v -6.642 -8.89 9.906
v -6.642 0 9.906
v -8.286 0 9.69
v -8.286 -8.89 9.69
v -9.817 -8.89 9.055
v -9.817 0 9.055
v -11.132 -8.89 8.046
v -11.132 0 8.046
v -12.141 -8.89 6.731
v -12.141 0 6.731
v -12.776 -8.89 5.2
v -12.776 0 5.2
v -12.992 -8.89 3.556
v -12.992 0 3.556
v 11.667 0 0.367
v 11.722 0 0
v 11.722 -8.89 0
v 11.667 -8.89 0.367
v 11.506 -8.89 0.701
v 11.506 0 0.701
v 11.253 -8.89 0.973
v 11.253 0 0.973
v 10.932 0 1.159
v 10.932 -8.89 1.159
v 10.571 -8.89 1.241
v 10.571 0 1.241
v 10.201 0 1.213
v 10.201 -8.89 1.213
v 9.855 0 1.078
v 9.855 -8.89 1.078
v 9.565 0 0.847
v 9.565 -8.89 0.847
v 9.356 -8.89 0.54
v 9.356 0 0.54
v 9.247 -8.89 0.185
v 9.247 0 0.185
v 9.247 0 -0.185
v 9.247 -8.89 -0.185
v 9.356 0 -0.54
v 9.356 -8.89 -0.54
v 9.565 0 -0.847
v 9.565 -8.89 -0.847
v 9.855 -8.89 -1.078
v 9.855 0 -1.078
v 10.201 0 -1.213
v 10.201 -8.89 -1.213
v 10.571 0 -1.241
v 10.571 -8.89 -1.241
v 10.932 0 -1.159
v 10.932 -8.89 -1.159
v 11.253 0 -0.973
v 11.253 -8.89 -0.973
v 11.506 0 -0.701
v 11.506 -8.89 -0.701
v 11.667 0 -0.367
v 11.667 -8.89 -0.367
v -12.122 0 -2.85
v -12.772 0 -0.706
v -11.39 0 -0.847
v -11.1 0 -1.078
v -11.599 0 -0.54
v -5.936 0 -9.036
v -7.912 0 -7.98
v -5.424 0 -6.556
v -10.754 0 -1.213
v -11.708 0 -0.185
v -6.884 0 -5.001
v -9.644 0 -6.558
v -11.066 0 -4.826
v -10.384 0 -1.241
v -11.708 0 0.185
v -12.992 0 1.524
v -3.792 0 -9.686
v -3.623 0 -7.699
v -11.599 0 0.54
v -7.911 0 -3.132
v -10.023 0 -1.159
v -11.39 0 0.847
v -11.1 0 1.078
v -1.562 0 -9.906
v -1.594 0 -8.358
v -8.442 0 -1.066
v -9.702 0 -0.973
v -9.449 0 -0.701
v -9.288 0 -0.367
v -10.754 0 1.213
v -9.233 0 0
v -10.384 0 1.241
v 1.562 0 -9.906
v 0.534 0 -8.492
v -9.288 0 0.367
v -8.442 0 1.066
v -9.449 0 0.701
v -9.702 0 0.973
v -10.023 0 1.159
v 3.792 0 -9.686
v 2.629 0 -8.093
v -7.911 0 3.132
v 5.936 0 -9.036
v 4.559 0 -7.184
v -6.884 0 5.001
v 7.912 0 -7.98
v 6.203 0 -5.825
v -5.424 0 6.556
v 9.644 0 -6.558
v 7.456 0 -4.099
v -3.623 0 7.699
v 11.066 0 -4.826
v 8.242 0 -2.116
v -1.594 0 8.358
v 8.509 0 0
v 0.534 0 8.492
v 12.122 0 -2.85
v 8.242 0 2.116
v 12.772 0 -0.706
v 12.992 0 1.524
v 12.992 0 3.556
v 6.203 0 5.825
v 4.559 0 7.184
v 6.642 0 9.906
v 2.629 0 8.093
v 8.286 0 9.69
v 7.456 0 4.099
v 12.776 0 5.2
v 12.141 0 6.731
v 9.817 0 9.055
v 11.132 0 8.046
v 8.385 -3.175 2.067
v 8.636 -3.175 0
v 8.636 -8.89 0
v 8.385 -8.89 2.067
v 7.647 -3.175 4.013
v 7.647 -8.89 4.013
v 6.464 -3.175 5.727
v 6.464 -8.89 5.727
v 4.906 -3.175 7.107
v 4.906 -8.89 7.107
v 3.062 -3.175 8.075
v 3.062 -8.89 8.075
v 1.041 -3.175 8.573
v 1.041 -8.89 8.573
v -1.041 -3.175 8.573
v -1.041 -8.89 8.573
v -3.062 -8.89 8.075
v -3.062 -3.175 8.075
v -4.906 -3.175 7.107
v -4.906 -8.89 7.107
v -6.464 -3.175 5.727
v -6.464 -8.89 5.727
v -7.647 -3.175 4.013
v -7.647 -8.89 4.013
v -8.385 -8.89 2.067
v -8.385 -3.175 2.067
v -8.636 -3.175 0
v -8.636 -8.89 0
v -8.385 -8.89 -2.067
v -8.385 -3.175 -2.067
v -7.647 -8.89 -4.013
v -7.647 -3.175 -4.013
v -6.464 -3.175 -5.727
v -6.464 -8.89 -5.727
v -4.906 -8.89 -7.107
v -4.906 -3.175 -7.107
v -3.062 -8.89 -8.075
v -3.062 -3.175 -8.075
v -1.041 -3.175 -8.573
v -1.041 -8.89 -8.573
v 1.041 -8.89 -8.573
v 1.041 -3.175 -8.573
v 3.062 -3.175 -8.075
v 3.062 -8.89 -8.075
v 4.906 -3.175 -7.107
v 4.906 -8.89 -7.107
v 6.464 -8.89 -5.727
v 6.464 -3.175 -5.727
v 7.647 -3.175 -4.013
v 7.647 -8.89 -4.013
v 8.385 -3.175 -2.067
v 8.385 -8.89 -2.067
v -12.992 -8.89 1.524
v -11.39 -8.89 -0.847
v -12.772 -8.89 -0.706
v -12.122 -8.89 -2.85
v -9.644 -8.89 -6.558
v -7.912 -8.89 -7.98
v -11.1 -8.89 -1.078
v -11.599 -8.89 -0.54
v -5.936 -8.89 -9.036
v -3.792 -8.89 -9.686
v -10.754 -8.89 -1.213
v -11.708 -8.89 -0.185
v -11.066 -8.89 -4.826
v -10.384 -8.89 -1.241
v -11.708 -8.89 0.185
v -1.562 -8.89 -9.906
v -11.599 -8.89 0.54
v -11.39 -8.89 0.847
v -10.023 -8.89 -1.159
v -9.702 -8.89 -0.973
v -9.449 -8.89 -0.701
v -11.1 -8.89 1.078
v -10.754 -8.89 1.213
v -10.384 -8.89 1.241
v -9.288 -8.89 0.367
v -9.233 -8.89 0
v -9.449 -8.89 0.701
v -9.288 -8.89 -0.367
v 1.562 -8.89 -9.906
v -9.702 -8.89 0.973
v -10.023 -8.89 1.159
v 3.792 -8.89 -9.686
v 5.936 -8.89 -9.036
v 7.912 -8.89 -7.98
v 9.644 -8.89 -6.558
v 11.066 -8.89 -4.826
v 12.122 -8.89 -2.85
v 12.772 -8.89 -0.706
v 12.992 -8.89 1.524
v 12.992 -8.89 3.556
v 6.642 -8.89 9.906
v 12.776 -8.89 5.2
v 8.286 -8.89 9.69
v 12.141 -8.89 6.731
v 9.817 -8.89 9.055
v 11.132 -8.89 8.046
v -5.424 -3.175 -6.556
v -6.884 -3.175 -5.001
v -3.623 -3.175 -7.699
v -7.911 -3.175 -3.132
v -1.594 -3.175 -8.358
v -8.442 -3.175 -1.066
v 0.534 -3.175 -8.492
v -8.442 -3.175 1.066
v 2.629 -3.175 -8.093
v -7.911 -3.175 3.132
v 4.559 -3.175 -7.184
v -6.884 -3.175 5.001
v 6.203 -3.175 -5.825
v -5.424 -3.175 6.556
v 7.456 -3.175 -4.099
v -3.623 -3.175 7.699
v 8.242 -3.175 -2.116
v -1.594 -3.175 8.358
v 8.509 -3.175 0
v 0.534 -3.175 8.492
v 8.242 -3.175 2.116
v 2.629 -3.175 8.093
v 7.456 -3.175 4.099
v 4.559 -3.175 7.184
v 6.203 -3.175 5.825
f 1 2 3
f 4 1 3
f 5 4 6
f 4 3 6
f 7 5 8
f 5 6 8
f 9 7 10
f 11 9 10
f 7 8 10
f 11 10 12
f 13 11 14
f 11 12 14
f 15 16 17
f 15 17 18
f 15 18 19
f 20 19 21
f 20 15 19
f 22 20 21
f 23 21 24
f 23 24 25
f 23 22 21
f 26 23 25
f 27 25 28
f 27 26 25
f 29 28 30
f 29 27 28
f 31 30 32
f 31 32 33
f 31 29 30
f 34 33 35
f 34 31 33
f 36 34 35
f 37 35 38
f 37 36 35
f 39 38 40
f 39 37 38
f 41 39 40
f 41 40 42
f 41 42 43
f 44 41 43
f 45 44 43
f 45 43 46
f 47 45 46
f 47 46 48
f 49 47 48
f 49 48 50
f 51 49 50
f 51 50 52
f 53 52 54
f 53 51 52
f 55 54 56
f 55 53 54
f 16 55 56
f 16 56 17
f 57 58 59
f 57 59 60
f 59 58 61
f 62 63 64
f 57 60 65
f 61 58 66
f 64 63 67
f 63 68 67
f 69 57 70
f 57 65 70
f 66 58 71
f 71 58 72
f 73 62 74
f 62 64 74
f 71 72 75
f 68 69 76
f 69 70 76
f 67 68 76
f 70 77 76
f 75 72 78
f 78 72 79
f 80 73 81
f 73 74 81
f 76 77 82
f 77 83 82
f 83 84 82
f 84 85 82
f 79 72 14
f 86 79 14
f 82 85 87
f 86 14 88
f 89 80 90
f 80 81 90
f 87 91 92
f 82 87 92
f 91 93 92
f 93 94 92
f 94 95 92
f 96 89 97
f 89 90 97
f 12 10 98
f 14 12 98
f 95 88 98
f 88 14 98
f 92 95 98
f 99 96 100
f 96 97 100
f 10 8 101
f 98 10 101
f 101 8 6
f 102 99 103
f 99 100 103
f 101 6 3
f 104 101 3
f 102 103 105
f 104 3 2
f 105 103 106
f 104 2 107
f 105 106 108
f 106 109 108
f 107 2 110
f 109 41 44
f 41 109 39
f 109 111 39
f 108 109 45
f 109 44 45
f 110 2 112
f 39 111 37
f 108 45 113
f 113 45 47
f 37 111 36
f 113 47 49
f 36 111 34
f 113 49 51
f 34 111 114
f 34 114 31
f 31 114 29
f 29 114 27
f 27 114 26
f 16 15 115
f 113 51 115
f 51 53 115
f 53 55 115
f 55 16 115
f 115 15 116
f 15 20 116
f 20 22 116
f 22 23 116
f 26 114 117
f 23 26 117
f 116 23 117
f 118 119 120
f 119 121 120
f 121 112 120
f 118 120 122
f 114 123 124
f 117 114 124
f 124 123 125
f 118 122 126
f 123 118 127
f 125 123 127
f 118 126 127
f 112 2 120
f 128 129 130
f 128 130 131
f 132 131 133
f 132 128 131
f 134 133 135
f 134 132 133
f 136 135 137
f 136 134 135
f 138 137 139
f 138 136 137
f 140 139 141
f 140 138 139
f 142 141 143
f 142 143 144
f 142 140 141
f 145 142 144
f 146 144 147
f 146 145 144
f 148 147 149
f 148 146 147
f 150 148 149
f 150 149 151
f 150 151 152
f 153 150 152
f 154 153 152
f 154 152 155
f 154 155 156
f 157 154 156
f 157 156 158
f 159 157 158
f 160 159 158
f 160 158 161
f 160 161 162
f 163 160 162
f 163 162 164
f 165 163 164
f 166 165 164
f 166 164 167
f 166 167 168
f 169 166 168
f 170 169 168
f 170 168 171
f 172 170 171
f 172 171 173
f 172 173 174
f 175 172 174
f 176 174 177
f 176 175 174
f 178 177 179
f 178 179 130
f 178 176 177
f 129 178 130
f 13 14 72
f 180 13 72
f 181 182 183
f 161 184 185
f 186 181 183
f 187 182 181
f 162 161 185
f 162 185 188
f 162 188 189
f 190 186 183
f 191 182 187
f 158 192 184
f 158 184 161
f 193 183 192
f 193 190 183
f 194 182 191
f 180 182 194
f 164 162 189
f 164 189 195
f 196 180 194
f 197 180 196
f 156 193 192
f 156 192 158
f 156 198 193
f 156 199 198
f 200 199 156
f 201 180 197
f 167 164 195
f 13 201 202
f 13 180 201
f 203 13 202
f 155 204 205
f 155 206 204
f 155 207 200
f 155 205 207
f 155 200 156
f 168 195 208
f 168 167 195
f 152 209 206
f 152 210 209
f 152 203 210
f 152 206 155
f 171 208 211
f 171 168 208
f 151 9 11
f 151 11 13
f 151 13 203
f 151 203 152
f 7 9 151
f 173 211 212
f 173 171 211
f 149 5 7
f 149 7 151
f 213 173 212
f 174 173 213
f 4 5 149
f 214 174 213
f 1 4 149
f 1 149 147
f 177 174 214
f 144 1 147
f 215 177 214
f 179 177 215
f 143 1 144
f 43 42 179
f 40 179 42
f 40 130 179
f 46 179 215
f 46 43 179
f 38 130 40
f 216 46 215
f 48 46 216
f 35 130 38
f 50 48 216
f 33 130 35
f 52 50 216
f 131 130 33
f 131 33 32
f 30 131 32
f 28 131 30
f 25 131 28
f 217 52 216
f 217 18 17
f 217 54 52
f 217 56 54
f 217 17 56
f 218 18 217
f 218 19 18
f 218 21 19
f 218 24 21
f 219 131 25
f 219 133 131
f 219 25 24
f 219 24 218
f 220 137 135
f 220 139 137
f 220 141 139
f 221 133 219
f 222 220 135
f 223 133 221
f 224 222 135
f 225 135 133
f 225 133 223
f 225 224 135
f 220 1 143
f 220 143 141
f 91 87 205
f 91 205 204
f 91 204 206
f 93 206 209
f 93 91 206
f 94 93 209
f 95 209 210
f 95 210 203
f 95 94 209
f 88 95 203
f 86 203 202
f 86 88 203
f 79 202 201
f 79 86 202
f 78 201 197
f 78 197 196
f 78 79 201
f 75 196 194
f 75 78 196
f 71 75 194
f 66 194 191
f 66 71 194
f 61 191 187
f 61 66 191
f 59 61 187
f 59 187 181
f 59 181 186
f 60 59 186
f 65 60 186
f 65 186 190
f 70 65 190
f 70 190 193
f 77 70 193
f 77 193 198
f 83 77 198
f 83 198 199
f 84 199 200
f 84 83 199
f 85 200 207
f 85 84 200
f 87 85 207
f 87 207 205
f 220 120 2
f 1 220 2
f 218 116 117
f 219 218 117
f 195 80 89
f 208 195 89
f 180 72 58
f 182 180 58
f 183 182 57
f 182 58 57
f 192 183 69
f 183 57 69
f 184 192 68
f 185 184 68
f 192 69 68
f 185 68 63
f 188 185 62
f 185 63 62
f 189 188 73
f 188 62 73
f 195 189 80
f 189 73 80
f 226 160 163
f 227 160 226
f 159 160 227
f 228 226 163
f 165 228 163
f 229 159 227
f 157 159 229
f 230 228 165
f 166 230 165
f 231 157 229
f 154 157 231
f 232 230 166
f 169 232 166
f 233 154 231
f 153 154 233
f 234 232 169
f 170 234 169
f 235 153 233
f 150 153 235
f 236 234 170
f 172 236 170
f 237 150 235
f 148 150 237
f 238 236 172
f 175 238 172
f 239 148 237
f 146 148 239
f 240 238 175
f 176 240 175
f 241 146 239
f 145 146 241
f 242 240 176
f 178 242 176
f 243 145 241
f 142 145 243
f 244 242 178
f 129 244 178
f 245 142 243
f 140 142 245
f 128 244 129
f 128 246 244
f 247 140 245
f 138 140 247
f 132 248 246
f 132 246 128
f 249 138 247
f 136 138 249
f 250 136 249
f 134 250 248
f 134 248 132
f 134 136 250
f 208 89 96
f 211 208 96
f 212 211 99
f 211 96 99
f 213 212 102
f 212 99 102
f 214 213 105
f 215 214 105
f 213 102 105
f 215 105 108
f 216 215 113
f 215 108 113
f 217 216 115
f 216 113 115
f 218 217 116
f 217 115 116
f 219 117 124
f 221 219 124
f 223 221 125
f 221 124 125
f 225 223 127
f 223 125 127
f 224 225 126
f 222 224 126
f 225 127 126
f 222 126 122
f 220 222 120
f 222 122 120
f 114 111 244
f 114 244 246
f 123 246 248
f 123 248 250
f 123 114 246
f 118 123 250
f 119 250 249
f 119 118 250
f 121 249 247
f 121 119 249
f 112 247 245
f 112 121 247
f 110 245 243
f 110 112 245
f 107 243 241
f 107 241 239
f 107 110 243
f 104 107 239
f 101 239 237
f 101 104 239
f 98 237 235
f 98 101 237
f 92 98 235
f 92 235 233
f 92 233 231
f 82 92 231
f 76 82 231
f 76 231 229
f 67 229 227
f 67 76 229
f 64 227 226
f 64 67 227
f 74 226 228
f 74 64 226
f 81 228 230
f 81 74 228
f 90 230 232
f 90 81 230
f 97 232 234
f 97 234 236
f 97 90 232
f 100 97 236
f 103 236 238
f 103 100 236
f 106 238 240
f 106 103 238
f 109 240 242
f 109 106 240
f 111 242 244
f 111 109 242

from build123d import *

# Parameters (mm, degrees)
F0_R     = 1.2446
F0_R_2   = 8.636
F1_DEPTH = 8.89
F0_R_3   = 8.509
F2_DEPTH = 3.175


with BuildPart() as f1:
    # F0 (on Front) → F1 (new body)
    with BuildSketch(Plane.XZ):
        with BuildLine():
            Line((6.6421, 9.906), (-6.6421, 9.906))
            ThreePointArc((-6.6421, 9.906), (-11.132228, 8.046128), (-12.9921, 3.556))
            Line((-12.9921, 3.556), (-12.9921, 1.524))
            ThreePointArc((-12.9921, 1.524), (-9.644331, -6.558231), (-1.5621, -9.906))
            Line((-1.5621, -9.906), (1.5621, -9.906))
            ThreePointArc((1.5621, -9.906), (9.644331, -6.558231), (12.9921, 1.524))
            Line((12.9921, 1.524), (12.9921, 3.556))
            ThreePointArc((12.9921, 3.556), (11.132228, 8.046128), (6.6421, 9.906))
        make_face()
        with Locations((-10.4775, 0)):
            Circle(F0_R, mode=Mode.SUBTRACT)
        Circle(F0_R_2, mode=Mode.SUBTRACT)
        with Locations((10.4775, 0)):
            Circle(F0_R, mode=Mode.SUBTRACT)
    extrude(amount=F1_DEPTH)

    # F0 (on Front) → F2 (join)
    with BuildSketch(Plane.XZ):
        Circle(F0_R_2)
        Circle(F0_R_3, mode=Mode.SUBTRACT)
    extrude(amount=F2_DEPTH)


solid = f1.part
